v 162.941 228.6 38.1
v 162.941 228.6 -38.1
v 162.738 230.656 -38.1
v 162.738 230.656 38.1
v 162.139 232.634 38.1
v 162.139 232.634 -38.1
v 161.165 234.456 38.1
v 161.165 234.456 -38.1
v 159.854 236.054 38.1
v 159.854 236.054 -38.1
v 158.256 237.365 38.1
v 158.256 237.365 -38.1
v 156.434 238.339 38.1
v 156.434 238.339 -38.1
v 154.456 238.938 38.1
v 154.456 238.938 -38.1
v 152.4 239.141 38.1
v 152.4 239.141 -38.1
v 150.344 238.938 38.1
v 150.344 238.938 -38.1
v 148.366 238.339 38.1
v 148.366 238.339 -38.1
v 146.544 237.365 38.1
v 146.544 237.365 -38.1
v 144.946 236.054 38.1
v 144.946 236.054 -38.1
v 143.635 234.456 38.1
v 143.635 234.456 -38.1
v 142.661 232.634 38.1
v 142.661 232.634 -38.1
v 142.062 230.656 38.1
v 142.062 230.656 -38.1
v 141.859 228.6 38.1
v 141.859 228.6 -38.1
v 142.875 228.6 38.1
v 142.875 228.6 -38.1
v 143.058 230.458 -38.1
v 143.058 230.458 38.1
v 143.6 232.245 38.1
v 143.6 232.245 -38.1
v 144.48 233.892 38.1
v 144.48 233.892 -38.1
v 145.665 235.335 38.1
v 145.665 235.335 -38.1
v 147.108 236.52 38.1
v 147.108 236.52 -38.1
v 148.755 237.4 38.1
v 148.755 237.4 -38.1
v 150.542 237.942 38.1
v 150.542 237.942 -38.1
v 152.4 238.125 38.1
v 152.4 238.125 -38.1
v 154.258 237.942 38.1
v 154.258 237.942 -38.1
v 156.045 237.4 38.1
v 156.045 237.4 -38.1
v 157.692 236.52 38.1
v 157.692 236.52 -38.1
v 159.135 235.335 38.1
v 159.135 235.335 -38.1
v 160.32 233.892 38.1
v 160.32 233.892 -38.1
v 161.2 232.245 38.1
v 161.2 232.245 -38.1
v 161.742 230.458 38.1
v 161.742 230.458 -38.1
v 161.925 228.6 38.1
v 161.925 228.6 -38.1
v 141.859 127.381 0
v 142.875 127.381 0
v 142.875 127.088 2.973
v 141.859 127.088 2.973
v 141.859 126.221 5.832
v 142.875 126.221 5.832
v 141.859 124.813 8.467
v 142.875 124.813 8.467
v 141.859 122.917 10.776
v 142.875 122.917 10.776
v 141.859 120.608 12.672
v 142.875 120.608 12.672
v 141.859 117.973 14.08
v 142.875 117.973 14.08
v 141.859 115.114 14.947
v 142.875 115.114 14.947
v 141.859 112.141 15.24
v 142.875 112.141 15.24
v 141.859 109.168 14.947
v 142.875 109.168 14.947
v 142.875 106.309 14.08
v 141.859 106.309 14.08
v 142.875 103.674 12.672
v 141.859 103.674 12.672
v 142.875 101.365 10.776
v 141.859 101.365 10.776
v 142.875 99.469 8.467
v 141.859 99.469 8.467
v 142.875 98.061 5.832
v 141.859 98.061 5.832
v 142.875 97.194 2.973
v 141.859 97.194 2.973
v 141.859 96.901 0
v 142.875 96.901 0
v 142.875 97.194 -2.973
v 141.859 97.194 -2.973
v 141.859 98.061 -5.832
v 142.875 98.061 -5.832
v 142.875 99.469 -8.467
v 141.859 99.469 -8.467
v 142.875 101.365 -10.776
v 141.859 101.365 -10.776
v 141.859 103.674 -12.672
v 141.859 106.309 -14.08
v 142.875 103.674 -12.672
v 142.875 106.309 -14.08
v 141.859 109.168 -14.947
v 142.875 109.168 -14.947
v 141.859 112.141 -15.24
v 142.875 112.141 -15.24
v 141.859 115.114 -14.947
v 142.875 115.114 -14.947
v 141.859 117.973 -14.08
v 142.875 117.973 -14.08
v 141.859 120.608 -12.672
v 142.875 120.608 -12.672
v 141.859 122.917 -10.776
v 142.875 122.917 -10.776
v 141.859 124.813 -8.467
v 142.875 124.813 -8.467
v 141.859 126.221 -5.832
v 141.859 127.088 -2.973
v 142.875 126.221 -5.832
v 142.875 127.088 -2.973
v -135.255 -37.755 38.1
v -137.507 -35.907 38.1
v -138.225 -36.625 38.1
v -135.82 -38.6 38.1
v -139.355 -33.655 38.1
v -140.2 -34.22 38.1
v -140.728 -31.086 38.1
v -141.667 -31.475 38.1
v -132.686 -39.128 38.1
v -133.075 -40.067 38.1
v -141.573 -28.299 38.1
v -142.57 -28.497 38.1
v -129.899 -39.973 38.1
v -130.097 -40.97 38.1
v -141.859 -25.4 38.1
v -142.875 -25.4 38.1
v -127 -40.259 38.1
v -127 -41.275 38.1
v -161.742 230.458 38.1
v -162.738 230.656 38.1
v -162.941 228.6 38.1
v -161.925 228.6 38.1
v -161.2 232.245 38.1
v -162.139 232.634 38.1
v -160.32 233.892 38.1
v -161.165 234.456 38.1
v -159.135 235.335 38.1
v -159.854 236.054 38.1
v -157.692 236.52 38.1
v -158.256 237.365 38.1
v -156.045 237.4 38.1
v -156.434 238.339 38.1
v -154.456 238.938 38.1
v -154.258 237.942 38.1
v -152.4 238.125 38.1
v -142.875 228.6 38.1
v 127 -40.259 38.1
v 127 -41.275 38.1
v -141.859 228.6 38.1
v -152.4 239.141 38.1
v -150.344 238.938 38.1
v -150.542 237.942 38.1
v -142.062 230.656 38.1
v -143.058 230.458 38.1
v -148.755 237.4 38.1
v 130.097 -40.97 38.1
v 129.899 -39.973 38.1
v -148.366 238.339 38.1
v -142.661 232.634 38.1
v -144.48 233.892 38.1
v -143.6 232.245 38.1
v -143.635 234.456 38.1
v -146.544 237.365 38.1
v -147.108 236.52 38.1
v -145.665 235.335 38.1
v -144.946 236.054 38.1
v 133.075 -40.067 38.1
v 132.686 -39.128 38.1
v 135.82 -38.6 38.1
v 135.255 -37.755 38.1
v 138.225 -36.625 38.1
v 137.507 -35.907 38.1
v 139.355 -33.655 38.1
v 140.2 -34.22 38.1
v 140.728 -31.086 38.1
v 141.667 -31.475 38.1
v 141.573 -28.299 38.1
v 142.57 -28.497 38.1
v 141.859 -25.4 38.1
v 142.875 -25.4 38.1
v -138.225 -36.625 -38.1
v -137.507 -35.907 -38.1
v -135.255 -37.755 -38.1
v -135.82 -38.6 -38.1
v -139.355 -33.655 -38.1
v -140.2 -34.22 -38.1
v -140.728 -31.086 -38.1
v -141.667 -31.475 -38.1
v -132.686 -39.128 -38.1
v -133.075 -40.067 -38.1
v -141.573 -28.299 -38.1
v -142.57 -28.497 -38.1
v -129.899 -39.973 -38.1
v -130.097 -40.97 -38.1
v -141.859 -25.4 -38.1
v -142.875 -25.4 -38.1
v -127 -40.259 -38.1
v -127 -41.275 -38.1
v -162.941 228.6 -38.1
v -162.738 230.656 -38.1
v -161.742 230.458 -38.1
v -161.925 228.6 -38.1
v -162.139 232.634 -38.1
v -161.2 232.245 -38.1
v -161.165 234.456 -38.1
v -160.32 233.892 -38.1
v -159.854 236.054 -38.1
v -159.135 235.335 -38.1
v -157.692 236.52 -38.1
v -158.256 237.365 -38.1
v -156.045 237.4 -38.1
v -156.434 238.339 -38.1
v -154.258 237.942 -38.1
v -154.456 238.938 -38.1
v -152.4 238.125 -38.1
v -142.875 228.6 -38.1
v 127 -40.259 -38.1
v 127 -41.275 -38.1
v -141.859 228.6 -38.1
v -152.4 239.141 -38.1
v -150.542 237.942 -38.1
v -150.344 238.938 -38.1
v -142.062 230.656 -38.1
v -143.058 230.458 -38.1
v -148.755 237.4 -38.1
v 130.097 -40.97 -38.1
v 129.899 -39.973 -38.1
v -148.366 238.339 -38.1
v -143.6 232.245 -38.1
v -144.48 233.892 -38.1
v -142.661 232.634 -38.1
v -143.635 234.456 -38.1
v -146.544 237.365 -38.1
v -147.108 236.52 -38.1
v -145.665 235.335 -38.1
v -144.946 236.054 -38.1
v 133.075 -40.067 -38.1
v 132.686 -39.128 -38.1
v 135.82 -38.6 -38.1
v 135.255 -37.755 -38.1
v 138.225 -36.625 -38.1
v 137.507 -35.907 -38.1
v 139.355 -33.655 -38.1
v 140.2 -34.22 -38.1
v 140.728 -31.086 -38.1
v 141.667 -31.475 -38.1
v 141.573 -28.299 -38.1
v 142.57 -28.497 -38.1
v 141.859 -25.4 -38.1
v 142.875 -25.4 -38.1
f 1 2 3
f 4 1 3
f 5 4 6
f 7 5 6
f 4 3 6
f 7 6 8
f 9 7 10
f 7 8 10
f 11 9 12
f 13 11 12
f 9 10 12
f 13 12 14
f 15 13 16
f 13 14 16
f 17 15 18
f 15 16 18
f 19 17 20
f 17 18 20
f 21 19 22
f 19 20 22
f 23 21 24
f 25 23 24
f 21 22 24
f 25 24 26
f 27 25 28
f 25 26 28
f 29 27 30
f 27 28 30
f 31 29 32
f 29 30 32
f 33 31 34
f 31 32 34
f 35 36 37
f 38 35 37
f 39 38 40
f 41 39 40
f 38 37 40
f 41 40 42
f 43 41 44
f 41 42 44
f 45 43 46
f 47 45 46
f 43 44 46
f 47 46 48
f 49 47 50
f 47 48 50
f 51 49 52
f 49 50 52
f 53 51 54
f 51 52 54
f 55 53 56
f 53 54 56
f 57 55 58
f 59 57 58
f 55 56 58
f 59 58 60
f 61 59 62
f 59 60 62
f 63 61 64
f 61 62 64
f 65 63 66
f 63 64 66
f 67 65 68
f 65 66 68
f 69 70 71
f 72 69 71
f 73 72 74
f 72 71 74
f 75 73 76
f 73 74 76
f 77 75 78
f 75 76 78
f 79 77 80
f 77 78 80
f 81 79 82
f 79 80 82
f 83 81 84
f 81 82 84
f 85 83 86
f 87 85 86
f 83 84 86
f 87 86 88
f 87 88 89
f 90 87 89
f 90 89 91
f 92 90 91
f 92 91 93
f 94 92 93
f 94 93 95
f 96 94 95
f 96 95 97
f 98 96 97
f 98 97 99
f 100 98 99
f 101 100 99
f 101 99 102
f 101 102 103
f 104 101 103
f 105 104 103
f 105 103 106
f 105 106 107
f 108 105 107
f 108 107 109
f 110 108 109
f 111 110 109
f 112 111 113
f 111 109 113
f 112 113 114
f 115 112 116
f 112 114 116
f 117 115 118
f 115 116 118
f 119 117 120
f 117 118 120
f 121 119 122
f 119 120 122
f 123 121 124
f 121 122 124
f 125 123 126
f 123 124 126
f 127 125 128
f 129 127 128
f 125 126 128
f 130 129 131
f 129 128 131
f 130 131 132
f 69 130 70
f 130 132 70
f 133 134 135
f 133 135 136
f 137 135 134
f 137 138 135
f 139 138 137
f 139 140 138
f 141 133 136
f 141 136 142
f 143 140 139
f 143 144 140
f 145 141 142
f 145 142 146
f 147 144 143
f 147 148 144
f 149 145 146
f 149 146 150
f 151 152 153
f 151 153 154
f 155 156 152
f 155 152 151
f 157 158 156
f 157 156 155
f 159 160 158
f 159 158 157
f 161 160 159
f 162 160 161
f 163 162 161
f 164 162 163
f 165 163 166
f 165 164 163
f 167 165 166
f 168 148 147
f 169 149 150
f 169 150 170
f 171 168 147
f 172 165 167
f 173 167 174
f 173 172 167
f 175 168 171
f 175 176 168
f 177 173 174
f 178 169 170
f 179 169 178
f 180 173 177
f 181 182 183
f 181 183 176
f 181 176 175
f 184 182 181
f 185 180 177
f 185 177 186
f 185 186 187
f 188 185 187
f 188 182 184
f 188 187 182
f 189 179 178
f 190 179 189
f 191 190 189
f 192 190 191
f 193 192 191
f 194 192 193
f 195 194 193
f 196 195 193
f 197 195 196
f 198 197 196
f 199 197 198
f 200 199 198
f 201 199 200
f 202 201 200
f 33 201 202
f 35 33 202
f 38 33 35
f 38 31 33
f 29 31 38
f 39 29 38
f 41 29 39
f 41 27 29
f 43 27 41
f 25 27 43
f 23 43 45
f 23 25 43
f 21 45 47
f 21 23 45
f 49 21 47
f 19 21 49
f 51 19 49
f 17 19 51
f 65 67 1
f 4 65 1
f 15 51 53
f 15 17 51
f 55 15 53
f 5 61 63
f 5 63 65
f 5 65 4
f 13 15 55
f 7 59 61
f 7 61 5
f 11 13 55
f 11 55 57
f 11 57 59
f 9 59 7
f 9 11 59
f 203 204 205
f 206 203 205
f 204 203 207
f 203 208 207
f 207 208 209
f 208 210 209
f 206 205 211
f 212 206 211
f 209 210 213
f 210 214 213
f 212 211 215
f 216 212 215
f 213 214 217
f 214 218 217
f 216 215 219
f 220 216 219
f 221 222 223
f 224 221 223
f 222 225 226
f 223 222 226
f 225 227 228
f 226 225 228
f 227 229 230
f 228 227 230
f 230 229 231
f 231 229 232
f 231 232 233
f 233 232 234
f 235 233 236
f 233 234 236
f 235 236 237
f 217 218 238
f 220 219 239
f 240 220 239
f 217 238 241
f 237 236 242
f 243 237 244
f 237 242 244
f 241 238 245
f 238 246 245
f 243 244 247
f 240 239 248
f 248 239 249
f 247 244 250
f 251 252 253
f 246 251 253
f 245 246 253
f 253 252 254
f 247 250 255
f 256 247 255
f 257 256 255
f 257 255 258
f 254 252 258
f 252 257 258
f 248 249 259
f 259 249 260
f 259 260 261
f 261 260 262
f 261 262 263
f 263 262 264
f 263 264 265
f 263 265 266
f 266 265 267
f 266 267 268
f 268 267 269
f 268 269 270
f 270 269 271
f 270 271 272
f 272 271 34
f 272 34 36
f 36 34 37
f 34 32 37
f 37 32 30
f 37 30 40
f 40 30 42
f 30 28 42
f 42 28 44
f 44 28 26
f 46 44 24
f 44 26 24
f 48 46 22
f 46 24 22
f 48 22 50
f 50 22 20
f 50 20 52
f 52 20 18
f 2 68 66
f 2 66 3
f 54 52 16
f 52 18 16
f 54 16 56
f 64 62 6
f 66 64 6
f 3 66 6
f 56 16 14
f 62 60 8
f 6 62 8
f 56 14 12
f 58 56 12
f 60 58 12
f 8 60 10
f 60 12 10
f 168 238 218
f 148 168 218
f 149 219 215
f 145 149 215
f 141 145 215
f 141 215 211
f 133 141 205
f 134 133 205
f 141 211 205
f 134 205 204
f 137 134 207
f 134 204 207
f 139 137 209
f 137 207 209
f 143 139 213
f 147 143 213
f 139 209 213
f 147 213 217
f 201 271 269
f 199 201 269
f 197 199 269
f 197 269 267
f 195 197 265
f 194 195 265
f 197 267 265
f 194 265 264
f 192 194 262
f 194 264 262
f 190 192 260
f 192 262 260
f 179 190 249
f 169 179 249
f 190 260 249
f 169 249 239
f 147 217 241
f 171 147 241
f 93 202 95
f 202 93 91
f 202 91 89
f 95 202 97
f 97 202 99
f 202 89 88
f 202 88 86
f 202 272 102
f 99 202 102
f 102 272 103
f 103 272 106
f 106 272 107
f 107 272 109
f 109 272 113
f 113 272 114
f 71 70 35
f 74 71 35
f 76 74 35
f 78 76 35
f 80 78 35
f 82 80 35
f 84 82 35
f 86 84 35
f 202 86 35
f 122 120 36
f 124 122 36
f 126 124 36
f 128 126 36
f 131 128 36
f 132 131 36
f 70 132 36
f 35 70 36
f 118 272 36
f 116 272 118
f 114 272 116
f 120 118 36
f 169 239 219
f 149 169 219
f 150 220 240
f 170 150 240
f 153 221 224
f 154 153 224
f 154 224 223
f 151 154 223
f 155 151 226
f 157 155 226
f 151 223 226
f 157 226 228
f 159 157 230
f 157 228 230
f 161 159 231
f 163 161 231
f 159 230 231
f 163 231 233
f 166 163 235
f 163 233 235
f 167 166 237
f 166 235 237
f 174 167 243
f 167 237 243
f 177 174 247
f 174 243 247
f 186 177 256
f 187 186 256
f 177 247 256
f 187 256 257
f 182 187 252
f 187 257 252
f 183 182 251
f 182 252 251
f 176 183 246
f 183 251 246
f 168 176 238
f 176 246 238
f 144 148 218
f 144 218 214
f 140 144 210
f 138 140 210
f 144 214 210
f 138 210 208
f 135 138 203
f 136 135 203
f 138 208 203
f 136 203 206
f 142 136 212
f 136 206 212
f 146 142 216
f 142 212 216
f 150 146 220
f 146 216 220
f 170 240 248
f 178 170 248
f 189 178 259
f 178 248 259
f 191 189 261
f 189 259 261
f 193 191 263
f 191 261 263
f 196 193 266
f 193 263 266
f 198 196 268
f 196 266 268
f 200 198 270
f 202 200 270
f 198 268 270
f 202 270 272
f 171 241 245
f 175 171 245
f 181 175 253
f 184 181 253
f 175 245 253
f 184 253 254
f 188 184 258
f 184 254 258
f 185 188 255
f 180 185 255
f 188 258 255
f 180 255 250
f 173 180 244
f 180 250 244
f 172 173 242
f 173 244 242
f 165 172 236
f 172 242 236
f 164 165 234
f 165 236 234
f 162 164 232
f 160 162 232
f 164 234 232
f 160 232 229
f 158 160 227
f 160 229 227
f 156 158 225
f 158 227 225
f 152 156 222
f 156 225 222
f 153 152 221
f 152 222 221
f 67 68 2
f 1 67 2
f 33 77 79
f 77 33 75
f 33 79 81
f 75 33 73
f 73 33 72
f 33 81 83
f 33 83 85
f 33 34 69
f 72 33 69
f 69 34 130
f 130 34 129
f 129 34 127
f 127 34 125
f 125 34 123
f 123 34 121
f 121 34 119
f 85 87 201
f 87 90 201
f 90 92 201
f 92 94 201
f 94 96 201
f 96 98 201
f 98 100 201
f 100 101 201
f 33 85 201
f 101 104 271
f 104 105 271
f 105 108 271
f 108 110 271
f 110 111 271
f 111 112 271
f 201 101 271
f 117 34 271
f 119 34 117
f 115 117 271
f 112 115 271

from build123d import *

# Parameters (mm, degrees)
STOCK_ROPE_START                        = -38.1
STOCK_ROPE_ROBOT_CHASSIS_MASTER_1_DEPTH = 76.2
CUT_EXTRUDE1_REACH                      = 392.081
SKETCH1_R                               = 15.24


# Read off the part's stored shape, not the designer's step: Stock-Rope Robot Chassis Master-1
with BuildPart() as part:
    # Stock-Rope Robot Chassis Master-1 outlin → Stock-Rope Robot Chassis Master-1 (new body)
    with BuildSketch(Plane.XY.offset(STOCK_ROPE_START)):
        with BuildLine():
            ThreePointArc((-127, -40.259), (-137.506899662, -35.906899662), (-141.859, -25.4))
            Line((-141.859, -25.4), (-141.859, 228.6))
            ThreePointArc((-141.859, 228.6), (-152.4, 239.141), (-162.941, 228.6))
            Line((-162.941, 228.6), (-161.925, 228.6))
            ThreePointArc((-161.925, 228.6), (-152.4, 238.125), (-142.875, 228.6))
            Line((-142.875, 228.6), (-142.875, -25.4))
            ThreePointArc((-142.875, -25.4), (-138.225320151, -36.625320151), (-127, -41.275))
            Line((-127, -41.275), (127, -41.275))
            ThreePointArc((127, -41.275), (138.225320151, -36.625320151), (142.875, -25.4))
            Line((142.875, -25.4), (142.875, 228.6))
            ThreePointArc((142.875, 228.6), (152.4, 238.125), (161.925, 228.6))
            Line((161.925, 228.6), (162.941, 228.6))
            ThreePointArc((162.941, 228.6), (152.4, 239.141), (141.859, 228.6))
            Line((141.859, 228.6), (141.859, -25.4))
            ThreePointArc((141.859, -25.4), (137.506899662, -35.906899662), (127, -40.259))
            Line((127, -40.259), (-127, -40.259))
        make_face()
    extrude(amount=STOCK_ROPE_ROBOT_CHASSIS_MASTER_1_DEPTH)

    # Sketch1 → Cut-Extrude1 (cut, up to next)
    with BuildSketch(Plane(origin=(142.875, 0, 0), x_dir=(0, 0, -1), z_dir=(1, 0, 0)), mode=Mode.PRIVATE) as cut_extrude1_sk1:
        with Locations(Location((0, 112.141, 0), (0, 0, 90))):
            Circle(SKETCH1_R)
    cut_extrude1_tool1 = extrude(cut_extrude1_sk1.sketch, amount=-CUT_EXTRUDE1_REACH, mode=Mode.PRIVATE) & part.part
    add(cut_extrude1_tool1.solids().sort_by_distance((142.875, 112.141, 0))[0], mode=Mode.SUBTRACT)


solid = part.part
